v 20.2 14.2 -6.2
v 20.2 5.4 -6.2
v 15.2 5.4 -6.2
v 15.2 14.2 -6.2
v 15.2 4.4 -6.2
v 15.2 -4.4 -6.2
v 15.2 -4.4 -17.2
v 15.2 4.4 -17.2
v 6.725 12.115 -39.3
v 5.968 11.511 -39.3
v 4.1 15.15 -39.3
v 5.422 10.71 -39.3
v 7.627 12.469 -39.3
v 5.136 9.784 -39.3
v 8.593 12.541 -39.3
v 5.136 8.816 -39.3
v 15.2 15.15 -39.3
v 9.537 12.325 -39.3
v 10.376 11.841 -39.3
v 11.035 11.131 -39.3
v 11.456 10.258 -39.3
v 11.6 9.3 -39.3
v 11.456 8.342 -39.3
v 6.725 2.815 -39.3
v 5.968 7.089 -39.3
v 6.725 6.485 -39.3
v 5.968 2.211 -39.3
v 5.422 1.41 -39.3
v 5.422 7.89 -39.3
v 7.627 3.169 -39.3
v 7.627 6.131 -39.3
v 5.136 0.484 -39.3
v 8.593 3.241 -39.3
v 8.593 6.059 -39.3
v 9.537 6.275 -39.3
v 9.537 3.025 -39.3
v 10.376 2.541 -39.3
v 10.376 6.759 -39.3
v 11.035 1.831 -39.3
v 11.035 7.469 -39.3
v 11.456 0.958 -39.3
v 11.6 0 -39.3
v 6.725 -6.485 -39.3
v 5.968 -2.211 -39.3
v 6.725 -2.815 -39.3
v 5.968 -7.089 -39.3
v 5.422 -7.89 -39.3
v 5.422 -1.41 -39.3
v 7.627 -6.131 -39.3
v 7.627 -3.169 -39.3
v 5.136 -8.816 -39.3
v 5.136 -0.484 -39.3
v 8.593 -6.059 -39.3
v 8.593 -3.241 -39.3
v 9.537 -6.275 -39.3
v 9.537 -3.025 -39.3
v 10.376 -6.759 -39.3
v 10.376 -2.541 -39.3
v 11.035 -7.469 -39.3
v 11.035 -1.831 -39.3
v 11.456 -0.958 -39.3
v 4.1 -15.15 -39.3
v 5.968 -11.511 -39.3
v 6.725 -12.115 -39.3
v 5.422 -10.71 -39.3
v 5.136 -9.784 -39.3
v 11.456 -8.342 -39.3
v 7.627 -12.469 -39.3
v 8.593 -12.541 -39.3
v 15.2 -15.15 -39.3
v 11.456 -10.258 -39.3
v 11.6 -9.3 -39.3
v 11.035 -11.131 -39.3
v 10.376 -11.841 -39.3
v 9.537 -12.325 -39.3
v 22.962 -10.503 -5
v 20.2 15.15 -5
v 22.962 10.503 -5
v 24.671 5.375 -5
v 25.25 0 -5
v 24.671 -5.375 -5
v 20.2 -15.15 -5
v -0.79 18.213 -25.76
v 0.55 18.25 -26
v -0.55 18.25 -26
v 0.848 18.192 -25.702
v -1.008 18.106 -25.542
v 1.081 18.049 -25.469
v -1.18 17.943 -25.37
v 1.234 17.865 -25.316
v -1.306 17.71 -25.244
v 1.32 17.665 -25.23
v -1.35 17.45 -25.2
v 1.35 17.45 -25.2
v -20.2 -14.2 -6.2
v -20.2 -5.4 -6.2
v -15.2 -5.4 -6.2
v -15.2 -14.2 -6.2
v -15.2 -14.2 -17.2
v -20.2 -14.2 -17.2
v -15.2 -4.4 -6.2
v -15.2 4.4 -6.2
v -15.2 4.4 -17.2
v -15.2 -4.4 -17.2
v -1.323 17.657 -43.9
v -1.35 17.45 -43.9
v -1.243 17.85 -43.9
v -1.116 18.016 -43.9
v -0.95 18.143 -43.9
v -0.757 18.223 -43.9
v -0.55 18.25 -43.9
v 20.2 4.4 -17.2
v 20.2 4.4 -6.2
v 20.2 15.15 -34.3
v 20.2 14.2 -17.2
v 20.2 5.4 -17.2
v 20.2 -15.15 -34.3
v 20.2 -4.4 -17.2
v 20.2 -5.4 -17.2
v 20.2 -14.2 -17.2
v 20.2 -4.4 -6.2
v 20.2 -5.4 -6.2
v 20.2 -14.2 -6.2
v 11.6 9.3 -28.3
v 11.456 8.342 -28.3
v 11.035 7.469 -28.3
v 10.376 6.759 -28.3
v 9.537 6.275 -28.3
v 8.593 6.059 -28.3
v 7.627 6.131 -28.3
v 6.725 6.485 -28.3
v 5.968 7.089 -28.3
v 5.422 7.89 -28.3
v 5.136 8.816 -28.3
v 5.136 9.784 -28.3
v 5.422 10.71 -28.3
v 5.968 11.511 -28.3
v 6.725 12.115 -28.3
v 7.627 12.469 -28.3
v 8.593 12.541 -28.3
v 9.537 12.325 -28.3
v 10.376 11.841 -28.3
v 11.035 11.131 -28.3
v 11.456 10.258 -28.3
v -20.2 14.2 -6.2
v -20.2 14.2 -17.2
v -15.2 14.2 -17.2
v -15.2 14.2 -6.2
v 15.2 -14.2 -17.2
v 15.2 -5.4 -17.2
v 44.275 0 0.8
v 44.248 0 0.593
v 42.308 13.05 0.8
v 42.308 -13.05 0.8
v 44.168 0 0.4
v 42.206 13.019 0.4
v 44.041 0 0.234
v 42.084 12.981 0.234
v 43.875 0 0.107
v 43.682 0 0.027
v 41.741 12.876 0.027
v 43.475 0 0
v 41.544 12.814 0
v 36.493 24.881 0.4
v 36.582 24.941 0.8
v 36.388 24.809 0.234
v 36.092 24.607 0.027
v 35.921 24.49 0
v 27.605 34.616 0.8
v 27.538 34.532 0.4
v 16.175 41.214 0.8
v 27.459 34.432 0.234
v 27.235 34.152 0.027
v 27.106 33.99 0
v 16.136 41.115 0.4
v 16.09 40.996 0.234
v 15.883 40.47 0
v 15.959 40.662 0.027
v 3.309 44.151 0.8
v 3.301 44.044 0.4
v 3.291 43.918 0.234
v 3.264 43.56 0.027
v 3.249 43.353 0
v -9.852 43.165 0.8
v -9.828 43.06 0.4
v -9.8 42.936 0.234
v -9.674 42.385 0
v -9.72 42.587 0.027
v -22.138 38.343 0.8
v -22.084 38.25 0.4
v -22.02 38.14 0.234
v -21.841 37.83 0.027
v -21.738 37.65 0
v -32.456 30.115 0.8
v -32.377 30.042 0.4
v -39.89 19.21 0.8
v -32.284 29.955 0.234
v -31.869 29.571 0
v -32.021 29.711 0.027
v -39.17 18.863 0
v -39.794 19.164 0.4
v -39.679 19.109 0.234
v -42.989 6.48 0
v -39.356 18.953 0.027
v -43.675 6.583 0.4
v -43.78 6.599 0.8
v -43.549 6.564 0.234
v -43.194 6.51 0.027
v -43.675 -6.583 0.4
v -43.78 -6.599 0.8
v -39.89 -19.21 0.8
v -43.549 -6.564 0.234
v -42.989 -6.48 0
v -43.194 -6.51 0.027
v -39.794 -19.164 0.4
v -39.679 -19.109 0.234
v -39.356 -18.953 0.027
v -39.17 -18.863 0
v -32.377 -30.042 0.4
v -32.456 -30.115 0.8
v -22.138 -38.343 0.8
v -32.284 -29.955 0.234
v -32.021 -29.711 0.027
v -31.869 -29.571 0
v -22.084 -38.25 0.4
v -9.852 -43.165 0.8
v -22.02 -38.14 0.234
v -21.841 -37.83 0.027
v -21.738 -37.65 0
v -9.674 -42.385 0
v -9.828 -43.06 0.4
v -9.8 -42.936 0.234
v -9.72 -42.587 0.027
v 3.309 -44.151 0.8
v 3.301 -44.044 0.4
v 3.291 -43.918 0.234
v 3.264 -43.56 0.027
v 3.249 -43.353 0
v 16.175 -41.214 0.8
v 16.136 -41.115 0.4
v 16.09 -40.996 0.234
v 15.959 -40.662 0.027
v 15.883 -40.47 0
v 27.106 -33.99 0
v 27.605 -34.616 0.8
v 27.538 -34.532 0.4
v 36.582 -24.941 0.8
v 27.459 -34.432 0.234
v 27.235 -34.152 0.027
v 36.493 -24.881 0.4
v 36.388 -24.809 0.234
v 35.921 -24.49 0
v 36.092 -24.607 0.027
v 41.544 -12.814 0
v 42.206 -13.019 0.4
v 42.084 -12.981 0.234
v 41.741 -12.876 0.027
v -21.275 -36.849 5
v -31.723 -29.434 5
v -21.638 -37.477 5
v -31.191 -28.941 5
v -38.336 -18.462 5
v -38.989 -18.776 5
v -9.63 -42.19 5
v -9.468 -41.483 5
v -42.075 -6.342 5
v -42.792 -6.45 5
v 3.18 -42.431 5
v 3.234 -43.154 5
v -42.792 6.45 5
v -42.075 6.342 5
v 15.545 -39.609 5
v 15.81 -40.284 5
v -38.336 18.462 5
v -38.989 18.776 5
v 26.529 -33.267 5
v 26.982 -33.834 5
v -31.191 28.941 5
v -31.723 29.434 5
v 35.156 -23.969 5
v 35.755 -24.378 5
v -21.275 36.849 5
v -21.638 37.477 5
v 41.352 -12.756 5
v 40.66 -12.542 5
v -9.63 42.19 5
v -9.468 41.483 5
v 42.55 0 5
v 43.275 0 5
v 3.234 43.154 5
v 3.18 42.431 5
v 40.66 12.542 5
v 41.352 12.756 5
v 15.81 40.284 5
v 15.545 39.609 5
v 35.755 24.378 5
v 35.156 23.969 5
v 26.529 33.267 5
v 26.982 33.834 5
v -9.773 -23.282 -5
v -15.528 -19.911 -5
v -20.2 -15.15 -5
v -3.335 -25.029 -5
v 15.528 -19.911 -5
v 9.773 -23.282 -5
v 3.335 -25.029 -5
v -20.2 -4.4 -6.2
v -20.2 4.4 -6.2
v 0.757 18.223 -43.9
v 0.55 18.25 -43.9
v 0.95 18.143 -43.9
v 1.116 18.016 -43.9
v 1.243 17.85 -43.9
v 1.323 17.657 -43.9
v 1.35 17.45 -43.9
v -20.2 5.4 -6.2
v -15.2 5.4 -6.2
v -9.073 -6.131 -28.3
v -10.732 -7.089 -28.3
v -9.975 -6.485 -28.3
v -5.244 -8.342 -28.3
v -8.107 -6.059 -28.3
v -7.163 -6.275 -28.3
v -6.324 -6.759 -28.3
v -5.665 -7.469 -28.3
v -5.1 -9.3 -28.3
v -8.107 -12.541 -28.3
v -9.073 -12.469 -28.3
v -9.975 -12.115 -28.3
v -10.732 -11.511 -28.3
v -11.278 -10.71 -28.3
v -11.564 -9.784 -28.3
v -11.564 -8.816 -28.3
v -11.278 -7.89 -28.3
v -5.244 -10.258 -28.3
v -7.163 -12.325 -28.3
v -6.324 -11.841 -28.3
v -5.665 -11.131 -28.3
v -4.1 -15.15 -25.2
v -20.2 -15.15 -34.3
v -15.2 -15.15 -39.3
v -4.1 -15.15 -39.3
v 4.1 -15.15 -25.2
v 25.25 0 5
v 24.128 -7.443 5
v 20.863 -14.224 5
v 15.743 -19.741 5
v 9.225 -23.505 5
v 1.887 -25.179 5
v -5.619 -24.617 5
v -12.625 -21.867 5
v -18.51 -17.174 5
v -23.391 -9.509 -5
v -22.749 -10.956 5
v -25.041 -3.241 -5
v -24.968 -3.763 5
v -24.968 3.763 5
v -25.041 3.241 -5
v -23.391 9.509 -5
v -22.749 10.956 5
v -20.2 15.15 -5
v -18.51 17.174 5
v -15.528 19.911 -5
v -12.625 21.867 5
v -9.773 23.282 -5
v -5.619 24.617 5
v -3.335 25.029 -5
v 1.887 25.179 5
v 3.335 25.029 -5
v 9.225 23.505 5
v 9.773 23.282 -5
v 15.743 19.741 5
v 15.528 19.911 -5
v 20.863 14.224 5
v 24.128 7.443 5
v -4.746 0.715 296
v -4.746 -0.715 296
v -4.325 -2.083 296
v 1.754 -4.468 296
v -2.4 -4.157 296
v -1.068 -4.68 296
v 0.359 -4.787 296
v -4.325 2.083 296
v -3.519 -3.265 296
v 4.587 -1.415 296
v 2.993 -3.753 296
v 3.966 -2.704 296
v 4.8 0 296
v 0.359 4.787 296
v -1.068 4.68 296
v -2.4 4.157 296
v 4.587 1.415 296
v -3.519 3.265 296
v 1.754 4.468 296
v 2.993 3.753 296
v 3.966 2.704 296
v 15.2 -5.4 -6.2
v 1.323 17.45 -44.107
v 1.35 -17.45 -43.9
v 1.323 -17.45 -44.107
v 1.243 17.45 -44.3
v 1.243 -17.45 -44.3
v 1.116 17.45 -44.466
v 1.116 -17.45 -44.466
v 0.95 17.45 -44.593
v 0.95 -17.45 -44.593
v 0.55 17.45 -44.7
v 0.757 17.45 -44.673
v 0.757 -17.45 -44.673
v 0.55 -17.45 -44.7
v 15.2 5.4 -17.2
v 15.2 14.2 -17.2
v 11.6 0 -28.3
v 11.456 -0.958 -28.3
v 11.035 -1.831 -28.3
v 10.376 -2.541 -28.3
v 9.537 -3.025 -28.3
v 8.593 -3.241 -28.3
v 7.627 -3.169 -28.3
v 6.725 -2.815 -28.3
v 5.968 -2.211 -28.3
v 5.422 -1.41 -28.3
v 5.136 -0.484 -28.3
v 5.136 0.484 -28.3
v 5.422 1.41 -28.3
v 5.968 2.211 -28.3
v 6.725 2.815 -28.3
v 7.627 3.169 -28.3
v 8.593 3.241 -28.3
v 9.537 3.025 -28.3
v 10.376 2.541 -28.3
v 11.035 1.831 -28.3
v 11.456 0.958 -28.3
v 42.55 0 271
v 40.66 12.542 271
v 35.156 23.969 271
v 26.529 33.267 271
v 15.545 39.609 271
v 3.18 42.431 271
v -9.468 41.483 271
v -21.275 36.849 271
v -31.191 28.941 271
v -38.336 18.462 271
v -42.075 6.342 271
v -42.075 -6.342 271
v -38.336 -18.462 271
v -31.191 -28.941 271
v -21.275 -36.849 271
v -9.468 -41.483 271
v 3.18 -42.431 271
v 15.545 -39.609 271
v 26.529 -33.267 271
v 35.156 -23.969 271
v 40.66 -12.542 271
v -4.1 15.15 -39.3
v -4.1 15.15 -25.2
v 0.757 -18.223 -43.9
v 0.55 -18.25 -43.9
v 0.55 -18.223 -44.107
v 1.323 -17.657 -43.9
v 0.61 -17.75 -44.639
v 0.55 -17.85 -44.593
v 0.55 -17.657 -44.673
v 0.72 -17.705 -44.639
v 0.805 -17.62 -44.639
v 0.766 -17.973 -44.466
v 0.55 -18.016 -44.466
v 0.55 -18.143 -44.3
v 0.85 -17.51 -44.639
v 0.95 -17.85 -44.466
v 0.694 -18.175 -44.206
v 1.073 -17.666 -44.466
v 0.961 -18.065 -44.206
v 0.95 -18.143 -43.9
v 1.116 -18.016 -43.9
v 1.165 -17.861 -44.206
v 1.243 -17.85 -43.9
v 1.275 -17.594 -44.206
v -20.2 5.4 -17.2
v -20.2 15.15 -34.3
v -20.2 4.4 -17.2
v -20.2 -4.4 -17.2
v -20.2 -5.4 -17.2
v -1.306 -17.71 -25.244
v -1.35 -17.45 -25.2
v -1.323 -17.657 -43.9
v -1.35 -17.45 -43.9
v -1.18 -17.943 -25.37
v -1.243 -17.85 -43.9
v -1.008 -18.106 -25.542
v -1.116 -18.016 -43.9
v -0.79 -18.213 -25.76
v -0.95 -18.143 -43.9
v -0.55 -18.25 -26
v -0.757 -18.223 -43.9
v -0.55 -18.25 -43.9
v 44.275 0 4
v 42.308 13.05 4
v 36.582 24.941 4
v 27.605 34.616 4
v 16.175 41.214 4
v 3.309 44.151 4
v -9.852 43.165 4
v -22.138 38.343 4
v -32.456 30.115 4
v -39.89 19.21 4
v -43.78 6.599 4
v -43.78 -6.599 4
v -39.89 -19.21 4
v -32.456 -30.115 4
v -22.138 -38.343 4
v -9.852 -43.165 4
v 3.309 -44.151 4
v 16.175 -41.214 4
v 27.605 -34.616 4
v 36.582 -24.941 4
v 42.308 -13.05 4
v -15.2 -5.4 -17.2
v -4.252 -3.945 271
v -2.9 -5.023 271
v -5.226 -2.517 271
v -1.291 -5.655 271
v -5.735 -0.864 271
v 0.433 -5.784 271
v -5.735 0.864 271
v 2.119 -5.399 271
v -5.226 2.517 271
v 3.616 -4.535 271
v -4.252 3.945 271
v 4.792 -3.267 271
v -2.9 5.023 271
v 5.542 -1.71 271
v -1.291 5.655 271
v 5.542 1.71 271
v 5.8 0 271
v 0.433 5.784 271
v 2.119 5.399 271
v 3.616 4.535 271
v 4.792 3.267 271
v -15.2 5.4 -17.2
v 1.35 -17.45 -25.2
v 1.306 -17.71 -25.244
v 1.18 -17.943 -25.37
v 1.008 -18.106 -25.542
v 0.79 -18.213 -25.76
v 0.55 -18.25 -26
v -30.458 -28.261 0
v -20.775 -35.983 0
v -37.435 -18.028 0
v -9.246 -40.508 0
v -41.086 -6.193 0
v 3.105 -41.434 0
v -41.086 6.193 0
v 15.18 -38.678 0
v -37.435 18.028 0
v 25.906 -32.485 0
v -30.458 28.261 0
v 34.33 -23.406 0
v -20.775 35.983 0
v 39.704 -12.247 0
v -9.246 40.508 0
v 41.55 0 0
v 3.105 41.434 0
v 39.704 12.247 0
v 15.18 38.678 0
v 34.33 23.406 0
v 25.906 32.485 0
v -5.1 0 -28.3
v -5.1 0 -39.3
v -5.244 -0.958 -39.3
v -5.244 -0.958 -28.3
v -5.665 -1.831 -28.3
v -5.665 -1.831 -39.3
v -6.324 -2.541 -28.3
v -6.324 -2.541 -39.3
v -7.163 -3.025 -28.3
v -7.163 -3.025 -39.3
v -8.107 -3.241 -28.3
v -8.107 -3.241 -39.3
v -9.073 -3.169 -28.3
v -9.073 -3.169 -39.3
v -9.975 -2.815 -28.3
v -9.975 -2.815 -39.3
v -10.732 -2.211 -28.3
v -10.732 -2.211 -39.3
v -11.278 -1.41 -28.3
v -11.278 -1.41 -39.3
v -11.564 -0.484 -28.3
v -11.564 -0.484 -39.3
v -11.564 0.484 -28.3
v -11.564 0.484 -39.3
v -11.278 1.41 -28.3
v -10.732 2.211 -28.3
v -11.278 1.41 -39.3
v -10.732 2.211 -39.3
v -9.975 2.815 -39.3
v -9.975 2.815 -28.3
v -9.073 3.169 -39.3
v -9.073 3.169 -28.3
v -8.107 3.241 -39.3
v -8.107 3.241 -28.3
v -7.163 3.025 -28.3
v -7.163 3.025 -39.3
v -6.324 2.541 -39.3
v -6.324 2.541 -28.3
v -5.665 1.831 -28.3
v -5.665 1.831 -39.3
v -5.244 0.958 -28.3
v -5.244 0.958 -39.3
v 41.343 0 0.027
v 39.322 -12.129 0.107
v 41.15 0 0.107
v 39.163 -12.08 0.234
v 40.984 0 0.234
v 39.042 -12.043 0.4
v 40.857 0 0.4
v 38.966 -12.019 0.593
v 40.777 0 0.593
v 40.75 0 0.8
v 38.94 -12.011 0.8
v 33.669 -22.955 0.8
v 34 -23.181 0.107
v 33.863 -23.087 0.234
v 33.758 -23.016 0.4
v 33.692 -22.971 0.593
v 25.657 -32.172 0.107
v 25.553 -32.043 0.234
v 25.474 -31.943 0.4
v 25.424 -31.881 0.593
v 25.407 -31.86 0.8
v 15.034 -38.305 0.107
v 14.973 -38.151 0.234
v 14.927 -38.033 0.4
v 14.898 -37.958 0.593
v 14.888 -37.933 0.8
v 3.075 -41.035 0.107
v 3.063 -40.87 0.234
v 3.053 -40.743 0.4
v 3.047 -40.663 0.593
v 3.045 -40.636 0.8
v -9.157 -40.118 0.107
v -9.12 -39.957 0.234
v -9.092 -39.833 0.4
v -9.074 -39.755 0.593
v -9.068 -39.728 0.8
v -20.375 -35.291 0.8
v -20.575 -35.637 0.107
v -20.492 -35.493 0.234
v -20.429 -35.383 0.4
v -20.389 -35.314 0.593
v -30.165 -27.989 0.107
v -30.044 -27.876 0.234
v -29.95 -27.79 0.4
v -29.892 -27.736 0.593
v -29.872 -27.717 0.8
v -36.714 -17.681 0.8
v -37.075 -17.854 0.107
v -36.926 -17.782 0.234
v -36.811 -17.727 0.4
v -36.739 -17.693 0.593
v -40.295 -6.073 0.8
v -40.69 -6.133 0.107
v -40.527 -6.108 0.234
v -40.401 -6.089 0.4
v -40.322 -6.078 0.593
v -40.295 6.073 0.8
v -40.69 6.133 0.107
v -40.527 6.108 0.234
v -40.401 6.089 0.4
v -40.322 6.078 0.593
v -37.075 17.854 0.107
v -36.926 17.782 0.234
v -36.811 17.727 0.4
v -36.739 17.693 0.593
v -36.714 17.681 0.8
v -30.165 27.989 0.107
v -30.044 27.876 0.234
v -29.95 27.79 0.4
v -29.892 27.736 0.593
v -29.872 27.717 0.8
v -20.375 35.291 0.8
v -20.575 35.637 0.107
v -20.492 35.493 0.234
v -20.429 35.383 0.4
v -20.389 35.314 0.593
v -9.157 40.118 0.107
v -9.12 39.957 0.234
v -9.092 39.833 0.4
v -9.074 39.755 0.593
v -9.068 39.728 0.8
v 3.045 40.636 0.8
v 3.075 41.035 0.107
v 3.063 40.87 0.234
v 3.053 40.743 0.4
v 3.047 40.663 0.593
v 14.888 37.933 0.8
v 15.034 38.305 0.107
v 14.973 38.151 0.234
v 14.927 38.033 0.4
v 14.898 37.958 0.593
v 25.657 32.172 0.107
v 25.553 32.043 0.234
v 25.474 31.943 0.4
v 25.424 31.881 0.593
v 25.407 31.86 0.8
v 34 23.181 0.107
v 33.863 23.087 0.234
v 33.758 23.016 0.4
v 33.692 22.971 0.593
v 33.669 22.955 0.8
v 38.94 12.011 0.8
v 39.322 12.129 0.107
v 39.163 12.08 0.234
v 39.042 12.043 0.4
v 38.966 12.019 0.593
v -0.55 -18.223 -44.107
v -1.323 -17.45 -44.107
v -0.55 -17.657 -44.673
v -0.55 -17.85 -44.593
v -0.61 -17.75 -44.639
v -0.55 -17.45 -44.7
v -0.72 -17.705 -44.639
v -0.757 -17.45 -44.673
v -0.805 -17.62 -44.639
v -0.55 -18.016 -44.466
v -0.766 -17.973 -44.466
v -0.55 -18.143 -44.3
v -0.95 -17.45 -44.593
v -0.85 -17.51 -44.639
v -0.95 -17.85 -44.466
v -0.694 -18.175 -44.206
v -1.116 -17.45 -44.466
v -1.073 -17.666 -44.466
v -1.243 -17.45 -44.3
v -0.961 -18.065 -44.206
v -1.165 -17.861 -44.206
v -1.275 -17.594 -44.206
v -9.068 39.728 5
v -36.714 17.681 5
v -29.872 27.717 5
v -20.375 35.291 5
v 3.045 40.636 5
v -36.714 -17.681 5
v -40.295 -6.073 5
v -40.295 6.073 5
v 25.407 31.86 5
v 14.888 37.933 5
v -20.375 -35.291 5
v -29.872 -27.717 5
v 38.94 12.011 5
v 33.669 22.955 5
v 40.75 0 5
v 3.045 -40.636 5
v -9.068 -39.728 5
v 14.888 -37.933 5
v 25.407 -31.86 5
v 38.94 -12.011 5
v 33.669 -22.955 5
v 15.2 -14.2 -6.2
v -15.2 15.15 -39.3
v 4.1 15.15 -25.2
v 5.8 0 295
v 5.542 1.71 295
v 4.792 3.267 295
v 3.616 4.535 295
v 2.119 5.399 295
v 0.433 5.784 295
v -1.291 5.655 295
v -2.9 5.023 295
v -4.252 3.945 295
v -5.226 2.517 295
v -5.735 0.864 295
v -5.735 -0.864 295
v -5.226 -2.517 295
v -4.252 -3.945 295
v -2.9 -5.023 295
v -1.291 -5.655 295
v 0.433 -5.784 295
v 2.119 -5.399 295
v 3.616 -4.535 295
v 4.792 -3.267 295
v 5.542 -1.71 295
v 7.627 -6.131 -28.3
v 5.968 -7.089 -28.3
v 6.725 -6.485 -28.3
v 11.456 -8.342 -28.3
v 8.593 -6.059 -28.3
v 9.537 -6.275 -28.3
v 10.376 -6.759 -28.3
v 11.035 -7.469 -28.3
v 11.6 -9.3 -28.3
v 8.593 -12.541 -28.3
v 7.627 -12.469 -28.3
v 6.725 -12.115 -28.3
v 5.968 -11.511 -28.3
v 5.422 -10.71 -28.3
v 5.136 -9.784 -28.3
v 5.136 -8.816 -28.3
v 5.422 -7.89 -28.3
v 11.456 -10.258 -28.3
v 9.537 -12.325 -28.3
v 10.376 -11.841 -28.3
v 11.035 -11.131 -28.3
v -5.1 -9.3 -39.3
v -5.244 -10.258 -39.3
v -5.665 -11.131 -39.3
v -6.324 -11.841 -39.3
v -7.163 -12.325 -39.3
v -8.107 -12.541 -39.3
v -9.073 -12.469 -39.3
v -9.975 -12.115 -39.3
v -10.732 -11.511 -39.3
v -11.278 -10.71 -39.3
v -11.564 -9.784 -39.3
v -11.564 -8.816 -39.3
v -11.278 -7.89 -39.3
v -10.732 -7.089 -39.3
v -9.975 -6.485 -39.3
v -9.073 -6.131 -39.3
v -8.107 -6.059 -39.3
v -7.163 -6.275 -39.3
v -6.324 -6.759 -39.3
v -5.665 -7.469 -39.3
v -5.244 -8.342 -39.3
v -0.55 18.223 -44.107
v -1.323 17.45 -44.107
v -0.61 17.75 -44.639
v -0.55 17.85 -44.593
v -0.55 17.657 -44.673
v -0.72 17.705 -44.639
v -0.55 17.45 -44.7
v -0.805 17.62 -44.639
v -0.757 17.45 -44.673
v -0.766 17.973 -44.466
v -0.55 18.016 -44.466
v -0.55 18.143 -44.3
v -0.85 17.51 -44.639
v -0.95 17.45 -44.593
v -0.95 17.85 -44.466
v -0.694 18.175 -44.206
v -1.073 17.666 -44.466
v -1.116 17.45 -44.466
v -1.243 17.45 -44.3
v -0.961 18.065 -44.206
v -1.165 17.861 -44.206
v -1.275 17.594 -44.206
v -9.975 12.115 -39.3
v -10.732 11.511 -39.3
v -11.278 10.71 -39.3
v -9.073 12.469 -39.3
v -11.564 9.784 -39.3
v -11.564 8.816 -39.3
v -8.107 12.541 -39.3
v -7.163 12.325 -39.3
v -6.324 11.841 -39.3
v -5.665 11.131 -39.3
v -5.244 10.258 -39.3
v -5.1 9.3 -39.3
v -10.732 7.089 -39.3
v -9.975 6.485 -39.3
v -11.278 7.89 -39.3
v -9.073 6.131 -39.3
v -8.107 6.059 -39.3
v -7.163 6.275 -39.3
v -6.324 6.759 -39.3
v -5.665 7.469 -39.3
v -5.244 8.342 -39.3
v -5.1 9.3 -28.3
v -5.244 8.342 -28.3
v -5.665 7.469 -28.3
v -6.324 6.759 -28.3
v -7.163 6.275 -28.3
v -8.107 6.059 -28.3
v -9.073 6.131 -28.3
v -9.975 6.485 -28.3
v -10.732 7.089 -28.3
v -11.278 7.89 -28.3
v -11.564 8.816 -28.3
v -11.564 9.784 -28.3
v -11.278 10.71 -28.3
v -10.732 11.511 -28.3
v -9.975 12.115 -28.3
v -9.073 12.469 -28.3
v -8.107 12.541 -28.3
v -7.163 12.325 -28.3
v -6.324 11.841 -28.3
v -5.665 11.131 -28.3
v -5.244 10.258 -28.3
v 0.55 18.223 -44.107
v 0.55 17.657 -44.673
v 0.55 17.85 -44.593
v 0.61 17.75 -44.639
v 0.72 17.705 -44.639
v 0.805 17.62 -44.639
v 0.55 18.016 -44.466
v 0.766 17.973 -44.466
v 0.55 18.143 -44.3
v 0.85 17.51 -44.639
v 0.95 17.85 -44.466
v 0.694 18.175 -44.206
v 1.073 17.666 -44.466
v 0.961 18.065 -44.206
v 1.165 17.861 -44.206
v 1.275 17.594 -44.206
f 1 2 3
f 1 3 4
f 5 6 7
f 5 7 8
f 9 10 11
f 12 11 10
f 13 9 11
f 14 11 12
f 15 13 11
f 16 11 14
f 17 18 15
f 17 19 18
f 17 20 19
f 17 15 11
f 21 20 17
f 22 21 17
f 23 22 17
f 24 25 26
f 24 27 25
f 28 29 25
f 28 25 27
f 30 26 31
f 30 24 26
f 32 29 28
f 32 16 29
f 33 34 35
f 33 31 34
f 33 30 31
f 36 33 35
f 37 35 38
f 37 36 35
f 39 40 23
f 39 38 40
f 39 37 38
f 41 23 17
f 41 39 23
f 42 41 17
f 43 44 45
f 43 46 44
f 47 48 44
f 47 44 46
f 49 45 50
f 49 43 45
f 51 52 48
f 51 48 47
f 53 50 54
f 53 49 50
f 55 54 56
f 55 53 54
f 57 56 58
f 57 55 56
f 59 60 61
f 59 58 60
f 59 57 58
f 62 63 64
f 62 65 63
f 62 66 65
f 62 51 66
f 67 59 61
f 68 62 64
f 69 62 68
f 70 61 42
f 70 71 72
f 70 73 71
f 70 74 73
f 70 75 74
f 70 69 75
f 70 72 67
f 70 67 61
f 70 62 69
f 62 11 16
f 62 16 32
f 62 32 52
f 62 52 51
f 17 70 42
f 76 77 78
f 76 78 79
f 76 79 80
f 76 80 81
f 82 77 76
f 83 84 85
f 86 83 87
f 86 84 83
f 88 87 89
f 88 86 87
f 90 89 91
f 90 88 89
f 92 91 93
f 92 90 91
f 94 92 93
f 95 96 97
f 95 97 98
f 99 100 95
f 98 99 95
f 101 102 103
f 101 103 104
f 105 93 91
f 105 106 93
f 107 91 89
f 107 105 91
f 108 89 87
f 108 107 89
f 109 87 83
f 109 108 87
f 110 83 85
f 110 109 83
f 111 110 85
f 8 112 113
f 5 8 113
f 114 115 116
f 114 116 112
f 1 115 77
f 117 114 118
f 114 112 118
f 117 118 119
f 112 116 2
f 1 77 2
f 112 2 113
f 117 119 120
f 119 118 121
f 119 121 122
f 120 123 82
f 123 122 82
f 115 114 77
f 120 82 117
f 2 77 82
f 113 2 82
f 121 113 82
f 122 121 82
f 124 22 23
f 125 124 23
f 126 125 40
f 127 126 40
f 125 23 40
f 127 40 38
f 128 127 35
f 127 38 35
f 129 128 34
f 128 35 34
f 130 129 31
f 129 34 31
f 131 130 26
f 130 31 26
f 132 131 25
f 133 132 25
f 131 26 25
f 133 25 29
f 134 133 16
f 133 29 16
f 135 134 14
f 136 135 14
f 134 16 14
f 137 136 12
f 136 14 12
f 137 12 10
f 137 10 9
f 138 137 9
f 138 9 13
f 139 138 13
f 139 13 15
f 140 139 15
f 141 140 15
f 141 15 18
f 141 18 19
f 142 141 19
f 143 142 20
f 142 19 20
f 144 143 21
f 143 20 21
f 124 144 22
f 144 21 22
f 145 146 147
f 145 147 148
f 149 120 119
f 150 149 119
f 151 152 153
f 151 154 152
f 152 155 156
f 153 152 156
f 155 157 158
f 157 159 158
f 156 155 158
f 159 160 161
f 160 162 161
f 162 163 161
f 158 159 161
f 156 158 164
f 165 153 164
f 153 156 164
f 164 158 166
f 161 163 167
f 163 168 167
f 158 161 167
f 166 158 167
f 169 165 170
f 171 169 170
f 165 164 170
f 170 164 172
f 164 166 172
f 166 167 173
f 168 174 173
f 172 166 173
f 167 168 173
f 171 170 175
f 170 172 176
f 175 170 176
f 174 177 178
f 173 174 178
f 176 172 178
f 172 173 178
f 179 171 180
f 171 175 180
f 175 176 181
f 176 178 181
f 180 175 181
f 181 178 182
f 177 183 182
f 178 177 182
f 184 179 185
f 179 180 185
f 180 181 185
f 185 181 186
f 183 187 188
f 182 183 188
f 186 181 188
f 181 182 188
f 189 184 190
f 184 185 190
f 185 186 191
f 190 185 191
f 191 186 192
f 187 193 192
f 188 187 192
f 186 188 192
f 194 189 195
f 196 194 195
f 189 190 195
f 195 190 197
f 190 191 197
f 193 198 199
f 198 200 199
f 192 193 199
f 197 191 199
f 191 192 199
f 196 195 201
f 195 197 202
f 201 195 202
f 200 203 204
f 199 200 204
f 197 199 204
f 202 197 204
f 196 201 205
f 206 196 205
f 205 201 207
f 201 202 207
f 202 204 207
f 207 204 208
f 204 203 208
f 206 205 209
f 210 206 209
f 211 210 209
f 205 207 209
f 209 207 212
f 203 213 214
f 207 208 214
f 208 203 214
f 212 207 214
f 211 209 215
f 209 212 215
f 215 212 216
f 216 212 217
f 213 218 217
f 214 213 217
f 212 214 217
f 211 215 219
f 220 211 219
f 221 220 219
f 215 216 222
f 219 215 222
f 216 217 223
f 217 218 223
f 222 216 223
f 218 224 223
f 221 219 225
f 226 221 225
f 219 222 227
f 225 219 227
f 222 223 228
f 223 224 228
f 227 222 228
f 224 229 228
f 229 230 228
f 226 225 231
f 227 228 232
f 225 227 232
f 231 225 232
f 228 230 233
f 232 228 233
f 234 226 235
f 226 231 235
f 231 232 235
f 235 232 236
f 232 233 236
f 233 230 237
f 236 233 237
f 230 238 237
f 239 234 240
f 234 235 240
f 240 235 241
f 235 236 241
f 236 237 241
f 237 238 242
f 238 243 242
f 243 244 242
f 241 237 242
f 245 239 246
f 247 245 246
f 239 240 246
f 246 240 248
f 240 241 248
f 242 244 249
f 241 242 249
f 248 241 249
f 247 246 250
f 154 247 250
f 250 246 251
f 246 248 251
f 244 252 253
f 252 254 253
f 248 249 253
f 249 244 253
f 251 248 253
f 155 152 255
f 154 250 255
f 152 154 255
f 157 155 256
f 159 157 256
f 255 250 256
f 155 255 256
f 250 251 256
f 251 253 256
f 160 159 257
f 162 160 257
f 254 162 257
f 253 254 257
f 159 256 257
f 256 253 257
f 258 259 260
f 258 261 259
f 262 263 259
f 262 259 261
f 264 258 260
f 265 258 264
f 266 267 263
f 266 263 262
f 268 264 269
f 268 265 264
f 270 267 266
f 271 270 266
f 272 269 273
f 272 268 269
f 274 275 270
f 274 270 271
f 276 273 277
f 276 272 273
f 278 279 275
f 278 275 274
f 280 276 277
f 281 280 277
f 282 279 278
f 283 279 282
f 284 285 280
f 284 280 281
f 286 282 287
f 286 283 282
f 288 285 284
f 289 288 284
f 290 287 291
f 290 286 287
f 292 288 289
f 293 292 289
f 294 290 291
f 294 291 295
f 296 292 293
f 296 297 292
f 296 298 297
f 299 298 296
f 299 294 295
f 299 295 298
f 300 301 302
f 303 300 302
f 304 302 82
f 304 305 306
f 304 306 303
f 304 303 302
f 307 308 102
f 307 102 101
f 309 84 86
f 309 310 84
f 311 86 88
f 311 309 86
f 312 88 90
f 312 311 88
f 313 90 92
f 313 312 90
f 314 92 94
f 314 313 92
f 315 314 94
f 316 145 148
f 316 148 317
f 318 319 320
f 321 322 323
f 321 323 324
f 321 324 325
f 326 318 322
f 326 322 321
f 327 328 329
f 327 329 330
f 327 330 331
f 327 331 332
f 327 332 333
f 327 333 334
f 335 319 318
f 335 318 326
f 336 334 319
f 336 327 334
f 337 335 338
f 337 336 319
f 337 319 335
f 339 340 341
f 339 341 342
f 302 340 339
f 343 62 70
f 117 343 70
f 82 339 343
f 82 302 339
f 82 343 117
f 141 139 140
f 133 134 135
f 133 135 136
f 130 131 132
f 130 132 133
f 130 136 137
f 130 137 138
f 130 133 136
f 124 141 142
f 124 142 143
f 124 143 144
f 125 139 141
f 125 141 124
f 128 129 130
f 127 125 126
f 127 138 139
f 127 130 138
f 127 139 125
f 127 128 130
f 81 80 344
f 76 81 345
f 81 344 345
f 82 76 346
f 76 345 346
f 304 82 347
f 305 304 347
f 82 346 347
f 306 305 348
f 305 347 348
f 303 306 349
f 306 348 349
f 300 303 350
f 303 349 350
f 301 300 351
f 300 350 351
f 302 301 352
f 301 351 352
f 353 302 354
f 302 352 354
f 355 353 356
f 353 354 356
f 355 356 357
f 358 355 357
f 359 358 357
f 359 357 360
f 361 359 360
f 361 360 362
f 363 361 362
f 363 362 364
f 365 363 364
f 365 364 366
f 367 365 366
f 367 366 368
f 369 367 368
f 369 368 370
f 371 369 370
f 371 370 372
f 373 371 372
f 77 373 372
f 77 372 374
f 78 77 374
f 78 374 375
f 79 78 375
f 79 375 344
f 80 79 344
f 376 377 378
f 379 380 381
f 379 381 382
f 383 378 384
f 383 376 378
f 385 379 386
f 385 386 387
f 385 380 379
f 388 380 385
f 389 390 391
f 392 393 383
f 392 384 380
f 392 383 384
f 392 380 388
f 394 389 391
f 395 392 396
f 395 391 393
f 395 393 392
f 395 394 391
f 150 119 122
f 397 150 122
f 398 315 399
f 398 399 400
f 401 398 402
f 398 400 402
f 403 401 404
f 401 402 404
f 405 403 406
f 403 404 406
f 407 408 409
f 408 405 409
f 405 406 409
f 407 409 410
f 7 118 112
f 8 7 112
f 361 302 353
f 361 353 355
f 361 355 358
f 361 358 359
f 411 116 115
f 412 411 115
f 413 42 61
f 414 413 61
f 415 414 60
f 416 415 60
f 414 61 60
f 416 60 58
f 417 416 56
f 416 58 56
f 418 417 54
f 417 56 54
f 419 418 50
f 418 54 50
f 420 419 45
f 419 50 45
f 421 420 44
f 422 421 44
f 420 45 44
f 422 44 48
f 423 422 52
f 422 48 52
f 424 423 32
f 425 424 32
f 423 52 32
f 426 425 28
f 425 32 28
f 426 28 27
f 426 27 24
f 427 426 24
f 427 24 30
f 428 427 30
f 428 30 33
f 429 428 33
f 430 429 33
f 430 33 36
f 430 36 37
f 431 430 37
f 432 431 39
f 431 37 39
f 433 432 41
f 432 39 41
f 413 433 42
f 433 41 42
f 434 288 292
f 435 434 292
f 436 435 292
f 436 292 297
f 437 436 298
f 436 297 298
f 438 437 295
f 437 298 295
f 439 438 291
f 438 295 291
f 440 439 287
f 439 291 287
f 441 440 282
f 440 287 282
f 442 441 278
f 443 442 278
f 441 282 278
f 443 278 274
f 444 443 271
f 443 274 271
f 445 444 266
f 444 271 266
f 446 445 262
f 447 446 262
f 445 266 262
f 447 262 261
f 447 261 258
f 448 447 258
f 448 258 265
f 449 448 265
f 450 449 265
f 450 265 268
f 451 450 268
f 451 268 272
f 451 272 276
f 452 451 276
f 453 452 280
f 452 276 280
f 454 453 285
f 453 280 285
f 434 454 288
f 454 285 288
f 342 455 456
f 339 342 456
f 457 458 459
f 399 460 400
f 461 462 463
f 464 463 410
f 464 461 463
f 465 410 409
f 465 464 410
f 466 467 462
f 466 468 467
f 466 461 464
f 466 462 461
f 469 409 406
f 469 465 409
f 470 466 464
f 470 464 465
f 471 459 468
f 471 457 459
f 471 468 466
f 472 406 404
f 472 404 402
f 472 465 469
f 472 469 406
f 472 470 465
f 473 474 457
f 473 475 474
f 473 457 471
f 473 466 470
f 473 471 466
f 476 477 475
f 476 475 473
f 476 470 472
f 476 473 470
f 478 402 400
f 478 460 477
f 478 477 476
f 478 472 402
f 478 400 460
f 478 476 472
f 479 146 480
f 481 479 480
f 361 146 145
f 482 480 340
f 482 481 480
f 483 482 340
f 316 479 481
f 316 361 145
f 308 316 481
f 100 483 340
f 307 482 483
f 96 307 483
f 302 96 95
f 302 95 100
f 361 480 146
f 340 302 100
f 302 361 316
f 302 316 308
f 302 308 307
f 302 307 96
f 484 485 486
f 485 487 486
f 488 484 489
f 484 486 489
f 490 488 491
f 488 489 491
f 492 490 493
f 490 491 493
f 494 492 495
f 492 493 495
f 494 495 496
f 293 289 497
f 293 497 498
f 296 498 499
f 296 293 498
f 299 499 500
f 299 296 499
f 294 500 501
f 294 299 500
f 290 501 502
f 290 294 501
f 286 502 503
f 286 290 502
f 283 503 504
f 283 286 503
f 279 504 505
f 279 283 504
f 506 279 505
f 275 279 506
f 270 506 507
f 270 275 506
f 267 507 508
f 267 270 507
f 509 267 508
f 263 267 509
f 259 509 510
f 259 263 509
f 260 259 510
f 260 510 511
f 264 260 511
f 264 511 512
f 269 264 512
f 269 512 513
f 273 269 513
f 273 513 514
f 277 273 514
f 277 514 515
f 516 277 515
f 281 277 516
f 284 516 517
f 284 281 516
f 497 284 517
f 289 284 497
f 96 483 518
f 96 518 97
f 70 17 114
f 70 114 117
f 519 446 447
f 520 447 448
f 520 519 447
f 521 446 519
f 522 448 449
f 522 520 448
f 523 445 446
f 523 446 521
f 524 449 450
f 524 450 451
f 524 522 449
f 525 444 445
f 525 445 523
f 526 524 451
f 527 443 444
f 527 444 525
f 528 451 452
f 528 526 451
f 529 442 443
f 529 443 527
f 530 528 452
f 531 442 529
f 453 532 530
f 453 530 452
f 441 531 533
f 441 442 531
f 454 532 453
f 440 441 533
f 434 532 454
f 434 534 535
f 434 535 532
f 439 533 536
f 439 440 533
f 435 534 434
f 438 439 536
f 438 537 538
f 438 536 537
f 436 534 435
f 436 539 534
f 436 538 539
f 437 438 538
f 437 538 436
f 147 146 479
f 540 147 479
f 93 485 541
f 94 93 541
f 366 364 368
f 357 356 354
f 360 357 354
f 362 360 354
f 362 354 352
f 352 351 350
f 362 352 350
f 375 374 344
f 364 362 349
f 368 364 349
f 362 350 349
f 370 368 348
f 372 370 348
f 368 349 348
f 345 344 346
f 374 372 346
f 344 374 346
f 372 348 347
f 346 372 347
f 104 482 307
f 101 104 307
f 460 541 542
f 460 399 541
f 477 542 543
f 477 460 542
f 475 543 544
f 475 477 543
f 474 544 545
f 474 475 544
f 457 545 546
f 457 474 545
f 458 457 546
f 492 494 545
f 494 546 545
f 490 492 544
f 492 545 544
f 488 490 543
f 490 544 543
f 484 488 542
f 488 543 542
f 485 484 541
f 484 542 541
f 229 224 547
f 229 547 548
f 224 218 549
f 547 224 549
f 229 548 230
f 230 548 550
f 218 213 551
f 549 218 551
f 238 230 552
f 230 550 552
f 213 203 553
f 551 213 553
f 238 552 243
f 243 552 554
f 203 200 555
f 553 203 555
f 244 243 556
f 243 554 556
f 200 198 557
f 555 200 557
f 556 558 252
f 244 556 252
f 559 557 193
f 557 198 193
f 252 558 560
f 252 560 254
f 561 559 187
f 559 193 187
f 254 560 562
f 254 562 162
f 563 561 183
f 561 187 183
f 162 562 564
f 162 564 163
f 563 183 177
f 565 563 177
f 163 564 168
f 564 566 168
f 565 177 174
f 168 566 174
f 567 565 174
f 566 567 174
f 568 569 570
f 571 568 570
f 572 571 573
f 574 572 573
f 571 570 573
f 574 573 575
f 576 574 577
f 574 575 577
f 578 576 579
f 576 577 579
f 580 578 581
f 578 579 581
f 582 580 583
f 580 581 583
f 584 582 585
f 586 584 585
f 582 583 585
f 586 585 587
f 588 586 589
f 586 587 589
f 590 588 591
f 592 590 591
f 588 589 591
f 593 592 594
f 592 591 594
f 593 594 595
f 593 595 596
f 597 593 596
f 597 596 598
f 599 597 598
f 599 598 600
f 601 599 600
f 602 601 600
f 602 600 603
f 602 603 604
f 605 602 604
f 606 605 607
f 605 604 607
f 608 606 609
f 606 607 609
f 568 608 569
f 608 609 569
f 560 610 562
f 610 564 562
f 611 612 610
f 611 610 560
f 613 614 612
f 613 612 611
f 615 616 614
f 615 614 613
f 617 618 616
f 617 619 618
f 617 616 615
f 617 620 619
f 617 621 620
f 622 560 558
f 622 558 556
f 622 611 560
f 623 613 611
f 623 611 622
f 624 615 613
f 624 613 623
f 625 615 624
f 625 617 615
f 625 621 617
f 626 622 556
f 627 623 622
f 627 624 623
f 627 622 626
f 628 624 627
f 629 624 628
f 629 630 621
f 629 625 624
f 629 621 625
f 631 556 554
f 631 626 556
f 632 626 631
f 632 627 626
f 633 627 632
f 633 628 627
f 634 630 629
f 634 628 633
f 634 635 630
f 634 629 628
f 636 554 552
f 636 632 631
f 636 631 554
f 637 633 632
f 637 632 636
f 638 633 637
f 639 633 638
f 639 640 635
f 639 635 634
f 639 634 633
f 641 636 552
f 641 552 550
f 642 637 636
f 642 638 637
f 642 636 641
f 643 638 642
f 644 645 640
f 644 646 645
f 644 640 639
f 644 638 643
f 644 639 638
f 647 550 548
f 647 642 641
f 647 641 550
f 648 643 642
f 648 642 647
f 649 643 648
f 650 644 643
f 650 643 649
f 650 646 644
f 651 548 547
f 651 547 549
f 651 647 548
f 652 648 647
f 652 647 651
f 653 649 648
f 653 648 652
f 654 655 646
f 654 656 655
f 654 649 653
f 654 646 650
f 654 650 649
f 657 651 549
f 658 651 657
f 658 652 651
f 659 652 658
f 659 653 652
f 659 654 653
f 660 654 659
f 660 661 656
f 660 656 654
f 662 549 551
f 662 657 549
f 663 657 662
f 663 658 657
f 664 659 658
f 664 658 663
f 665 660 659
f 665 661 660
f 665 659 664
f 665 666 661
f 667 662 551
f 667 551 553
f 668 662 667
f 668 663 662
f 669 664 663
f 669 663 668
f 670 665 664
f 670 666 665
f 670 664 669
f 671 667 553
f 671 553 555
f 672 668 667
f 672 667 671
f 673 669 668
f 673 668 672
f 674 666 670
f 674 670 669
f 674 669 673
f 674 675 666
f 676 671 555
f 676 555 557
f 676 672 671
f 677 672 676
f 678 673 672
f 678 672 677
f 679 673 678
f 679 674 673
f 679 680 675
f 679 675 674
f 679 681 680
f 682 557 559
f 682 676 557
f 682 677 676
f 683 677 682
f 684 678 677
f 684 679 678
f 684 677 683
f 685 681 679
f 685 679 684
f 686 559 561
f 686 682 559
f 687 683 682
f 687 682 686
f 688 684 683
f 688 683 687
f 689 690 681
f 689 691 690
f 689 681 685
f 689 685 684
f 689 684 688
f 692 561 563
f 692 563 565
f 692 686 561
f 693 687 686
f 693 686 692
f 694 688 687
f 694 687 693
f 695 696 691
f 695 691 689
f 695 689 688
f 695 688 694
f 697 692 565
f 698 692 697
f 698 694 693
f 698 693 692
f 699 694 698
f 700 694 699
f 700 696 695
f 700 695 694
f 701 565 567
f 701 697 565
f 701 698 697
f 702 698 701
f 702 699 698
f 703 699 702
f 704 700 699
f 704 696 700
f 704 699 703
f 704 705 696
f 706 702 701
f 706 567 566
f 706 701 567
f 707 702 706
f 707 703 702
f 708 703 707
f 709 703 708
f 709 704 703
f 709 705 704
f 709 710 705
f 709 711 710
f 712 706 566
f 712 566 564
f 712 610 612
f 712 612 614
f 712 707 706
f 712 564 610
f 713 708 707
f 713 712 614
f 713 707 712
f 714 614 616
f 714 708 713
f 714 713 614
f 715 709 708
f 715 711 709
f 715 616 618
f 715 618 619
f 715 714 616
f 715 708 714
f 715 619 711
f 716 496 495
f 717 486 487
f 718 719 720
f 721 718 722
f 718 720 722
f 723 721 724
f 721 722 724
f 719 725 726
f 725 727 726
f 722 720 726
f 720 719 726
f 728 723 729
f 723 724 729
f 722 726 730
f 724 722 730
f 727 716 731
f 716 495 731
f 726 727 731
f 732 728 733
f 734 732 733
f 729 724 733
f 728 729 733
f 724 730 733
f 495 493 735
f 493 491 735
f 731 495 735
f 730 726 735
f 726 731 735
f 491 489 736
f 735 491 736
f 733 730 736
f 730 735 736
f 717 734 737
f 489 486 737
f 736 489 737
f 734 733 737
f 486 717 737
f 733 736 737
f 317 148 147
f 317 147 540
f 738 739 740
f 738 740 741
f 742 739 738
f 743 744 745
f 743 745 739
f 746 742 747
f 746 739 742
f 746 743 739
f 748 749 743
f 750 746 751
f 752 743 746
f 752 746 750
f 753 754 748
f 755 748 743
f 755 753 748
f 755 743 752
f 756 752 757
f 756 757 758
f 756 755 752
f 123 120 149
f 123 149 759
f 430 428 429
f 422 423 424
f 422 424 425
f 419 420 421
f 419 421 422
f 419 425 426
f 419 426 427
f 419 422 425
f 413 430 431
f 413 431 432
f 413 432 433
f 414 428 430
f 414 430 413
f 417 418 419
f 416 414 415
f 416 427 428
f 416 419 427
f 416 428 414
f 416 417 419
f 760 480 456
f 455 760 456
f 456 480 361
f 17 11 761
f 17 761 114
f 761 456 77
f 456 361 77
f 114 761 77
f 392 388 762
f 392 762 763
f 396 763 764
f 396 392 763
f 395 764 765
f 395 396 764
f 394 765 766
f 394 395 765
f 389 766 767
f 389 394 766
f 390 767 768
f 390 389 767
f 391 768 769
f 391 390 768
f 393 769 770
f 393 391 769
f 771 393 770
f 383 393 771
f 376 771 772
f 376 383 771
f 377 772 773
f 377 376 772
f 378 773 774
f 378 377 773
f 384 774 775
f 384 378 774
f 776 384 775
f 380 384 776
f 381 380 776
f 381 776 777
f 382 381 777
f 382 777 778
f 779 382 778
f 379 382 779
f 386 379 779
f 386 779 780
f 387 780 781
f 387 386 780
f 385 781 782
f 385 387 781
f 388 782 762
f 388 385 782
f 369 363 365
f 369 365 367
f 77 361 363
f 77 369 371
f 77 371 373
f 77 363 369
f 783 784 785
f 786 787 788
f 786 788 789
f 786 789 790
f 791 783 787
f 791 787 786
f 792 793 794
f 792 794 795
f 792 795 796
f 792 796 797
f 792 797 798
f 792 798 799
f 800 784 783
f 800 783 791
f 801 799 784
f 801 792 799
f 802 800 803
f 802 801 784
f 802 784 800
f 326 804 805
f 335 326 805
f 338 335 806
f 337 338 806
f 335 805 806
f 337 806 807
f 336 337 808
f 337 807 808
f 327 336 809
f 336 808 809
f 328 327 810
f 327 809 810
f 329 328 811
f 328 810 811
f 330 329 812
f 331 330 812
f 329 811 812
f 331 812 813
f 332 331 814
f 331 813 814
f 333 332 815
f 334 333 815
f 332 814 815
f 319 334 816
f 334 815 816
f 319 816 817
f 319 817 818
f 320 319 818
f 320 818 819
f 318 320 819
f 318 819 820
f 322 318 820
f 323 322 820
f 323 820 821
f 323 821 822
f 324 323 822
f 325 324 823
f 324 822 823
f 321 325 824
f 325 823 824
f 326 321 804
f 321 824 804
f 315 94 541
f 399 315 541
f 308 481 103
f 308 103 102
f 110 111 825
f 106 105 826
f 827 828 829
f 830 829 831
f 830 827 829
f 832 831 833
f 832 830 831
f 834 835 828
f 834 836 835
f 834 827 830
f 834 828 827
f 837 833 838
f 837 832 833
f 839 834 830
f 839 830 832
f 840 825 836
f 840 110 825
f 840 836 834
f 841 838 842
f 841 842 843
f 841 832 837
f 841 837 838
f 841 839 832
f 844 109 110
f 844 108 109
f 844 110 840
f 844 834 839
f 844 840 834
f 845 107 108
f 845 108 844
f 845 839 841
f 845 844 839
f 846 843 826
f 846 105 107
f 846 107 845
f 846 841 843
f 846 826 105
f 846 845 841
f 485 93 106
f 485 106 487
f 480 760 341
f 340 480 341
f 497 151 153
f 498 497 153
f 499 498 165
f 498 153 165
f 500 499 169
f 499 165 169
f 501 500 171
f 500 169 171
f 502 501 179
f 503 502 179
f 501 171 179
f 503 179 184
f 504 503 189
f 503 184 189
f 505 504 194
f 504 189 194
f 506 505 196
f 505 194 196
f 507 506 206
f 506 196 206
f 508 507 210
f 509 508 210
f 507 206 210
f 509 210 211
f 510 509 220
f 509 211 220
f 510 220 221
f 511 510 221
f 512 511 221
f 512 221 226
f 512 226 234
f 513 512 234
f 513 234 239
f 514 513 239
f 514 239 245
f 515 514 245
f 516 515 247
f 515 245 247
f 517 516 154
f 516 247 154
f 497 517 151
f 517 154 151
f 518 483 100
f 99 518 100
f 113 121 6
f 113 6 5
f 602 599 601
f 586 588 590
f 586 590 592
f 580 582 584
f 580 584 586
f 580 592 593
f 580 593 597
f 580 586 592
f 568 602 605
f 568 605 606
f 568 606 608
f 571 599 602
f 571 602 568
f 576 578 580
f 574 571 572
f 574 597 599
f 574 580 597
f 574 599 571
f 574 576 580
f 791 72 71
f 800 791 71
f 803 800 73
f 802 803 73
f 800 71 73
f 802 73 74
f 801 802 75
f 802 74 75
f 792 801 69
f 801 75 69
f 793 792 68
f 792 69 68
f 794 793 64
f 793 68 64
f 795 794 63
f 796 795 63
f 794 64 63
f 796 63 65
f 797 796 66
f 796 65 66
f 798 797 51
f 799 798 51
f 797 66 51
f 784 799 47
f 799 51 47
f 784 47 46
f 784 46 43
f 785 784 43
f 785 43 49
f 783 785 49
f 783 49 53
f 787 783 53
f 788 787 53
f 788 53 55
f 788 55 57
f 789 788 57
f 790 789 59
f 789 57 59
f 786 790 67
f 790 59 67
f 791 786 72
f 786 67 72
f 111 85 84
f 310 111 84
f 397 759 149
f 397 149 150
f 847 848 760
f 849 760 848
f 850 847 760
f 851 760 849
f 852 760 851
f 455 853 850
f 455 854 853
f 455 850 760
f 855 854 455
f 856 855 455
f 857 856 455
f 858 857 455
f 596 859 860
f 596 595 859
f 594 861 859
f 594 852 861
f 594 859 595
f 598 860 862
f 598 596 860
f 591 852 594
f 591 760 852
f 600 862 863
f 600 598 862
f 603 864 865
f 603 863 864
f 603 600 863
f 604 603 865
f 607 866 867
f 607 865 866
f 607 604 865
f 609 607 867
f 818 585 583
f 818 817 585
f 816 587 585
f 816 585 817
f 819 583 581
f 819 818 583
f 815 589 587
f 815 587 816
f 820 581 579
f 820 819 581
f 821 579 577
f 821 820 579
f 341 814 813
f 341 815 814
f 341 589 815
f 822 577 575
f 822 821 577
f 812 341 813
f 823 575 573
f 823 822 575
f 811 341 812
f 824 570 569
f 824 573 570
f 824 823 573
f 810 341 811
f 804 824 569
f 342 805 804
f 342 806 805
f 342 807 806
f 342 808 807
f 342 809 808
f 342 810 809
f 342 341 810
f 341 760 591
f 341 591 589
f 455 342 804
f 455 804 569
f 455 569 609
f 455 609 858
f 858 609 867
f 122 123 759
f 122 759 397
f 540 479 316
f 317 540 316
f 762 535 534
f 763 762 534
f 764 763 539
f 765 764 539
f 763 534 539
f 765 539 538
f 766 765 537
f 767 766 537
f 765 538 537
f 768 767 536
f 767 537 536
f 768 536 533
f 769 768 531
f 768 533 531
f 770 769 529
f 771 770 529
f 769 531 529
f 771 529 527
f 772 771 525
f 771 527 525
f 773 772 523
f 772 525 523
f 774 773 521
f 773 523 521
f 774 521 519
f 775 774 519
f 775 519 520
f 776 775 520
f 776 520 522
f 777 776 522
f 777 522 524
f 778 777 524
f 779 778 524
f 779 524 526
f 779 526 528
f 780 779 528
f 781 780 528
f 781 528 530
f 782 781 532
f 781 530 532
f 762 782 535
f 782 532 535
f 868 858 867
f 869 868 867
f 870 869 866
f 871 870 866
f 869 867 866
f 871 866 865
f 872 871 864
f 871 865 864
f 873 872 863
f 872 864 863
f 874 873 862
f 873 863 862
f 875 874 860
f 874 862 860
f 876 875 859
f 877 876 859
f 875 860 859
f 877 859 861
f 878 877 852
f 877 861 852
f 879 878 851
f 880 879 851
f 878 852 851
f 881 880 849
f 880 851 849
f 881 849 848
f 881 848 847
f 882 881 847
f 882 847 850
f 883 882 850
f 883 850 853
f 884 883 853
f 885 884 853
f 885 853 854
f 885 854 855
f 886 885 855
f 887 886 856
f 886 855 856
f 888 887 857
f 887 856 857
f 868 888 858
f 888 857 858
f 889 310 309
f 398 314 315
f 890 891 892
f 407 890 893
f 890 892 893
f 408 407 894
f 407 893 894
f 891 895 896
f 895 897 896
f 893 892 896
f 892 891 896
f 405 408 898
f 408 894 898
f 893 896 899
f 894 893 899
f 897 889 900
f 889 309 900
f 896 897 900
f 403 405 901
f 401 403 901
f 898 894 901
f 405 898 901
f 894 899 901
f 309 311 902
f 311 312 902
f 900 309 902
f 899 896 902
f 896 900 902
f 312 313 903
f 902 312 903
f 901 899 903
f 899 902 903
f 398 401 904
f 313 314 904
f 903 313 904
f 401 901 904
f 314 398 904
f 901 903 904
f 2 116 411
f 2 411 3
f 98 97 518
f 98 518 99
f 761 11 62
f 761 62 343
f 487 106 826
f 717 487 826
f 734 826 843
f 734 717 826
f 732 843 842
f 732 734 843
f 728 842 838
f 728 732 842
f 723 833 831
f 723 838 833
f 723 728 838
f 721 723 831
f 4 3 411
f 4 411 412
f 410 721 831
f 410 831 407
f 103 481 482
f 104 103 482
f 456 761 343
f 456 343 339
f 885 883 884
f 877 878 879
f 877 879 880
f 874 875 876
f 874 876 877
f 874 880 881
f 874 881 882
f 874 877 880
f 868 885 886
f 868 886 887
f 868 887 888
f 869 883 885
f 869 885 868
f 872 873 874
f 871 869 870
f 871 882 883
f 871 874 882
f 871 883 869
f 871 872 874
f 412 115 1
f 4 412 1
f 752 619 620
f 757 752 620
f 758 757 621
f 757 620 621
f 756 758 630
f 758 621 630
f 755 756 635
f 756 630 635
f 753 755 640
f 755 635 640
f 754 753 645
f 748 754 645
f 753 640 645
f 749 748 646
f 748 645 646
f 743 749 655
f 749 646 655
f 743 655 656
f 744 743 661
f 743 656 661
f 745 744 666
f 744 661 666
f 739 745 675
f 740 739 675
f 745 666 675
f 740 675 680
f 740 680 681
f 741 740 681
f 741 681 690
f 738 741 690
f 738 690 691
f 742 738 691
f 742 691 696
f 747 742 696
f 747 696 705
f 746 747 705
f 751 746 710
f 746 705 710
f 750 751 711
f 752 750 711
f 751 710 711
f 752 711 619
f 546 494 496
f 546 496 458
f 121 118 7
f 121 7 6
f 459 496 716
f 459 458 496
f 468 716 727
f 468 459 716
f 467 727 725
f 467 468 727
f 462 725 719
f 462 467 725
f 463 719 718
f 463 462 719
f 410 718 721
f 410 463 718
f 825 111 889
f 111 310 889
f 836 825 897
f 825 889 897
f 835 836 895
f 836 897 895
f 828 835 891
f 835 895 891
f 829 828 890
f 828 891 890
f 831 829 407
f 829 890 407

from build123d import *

# Parameters (mm, degrees)
F0_R      = 44.275
F1_DEPTH  = 5
F2_R      = 42.55
F3_DEPTH  = 266
F4_SIZE   = 1
F5_R      = 5.8
F6_DEPTH  = 25
F7_SIZE   = 1
F8_R      = 40.75
F9_DEPTH  = 5
F10_R     = 25.25
F11_DEPTH = 10
F12_W     = 40.4
F12_H     = 30.3
F13_DEPTH = 34.3
F14_W     = 8.2
F14_H     = 14.1
F15_DEPTH = 59.426
F16_SIZE  = 5
F17_R     = 3.25
F18_DEPTH = 11
F19_W     = 8.8
F19_H     = 11
F20_DEPTH = 5
F21_W     = 8.8
F21_H     = 11
F22_DEPTH = 5
F23_W     = 2.7
F23_H     = 36.5
F24_DEPTH = 19.5
F25_R     = 0.8
F26_R     = 0.8


with BuildPart() as f1:
    # F0 (on Top) → F1 (new body)
    with BuildSketch(Plane.XY):
        Circle(F0_R)
    extrude(amount=F1_DEPTH)

    # F2 (on face) → F3 (join)
    with BuildSketch(Plane.XY.offset(5)):
        Circle(F2_R)
    extrude(amount=F3_DEPTH)

    # F4
    f4_edges = [f1.edges().sort_by_distance(p)[0] for p in [
        (-44.275, 0, 5),
    ]]
    chamfer(f4_edges, length=F4_SIZE)

    # F5 (on face) → F6 (join)
    with BuildSketch(Plane.XY.offset(271)):
        Circle(F5_R)
    extrude(amount=F6_DEPTH)

    # F7
    f7_edges = [f1.edges().sort_by_distance(p)[0] for p in [
        (-5.8, 0, 296),
    ]]
    chamfer(f7_edges, length=F7_SIZE)

    # F8 (on face) → F9 (cut)
    with BuildSketch(Plane(origin=(0, 0, 0), x_dir=(1, 0, 0), z_dir=(0, 0, -1))):
        Circle(F8_R)
    extrude(amount=-F9_DEPTH, mode=Mode.SUBTRACT)

    # F26
    f26_edges = [f1.edges().sort_by_distance(p)[0] for p in [
        (-44.275, 0, 0),
        (-40.75, 0, 0),
    ]]
    fillet(f26_edges, radius=F26_R)


with BuildPart() as f11:
    # F10 (on face) → F11 (new body)
    with BuildSketch(Plane(origin=(0, 0, 5), x_dir=(1, 0, 0), z_dir=(0, 0, -1))):
        Circle(F10_R)
    extrude(amount=F11_DEPTH)

    # F12 (on face) → F13 (join)
    with BuildSketch(Plane(origin=(0, 0, -5), x_dir=(1, 0, 0), z_dir=(0, 0, -1))):
        Rectangle(F12_W, F12_H)
    extrude(amount=F13_DEPTH)

    # F14 (on face) → F15 (cut, through all)
    with BuildSketch(Plane(origin=(0, 15.15, 0), x_dir=(-1, 0, 0), z_dir=(0, 1, 0))):
        with Locations((0, -32.25)):
            Rectangle(F14_W, F14_H)
    extrude(amount=-F15_DEPTH, mode=Mode.SUBTRACT)

    # F16
    f16_edges = [f11.edges().sort_by_distance(p)[0] for p in [
        (-20.2, 0, -39.3),
        (20.2, 0, -39.3),
    ]]
    chamfer(f16_edges, length=F16_SIZE)

    # F17 (on face) → F18 (cut)
    with BuildSketch(Plane(origin=(0, 0, -39.3), x_dir=(1, 0, 0), z_dir=(0, 0, -1))):
        with Locations((-8.35, 0)):
            Circle(F17_R)
        with Locations((-8.35, 9.3)):
            Circle(F17_R)
        with Locations((-8.35, -9.3)):
            Circle(F17_R)
        with Locations((8.35, 0)):
            Circle(F17_R)
        with Locations((8.35, 9.3)):
            Circle(F17_R)
        with Locations((8.35, -9.3)):
            Circle(F17_R)
    extrude(amount=-F18_DEPTH, mode=Mode.SUBTRACT)

    # F19 (on face) → F20 (cut)
    with BuildSketch(Plane(origin=(-20.2, 0, 0), x_dir=(0, -1, 0), z_dir=(-1, 0, 0))):
        with Locations((0, -11.7)):
            Rectangle(F19_W, F19_H)
        with Locations((-9.8, -11.7)):
            Rectangle(F19_W, F19_H)
        with Locations((9.8, -11.7)):
            Rectangle(F19_W, F19_H)
    extrude(amount=-F20_DEPTH, mode=Mode.SUBTRACT)

    # F21 (on face) → F22 (cut)
    with BuildSketch(Plane.YZ.offset(20.2)):
        with Locations((0, -11.7)):
            Rectangle(F21_W, F21_H)
        with Locations((-9.8, -11.7)):
            Rectangle(F21_W, F21_H)
        with Locations((9.8, -11.7)):
            Rectangle(F21_W, F21_H)
    extrude(amount=-F22_DEPTH, mode=Mode.SUBTRACT)


with BuildPart() as f24:
    # F23 (on face) → F24 (new body)
    with BuildSketch(Plane(origin=(0, 0, -25.2), x_dir=(1, 0, 0), z_dir=(0, 0, -1))):
        Rectangle(F23_W, F23_H)
    extrude(amount=F24_DEPTH)

    # F25
    f25_edges = [f24.edges().sort_by_distance(p)[0] for p in [
        (1.35, -18.25, -34.95),
        (-1.35, -18.25, -34.95),
        (0, -18.25, -25.2),
        (0, -18.25, -44.7),
        (-1.35, 18.25, -34.95),
        (1.35, 18.25, -34.95),
        (0, 18.25, -25.2),
        (0, 18.25, -44.7),
        (-1.35, 0, -44.7),
        (1.35, 0, -44.7),
    ]]
    fillet(f25_edges, radius=F25_R)


solid = Compound([f1.part, f11.part, f24.part])
